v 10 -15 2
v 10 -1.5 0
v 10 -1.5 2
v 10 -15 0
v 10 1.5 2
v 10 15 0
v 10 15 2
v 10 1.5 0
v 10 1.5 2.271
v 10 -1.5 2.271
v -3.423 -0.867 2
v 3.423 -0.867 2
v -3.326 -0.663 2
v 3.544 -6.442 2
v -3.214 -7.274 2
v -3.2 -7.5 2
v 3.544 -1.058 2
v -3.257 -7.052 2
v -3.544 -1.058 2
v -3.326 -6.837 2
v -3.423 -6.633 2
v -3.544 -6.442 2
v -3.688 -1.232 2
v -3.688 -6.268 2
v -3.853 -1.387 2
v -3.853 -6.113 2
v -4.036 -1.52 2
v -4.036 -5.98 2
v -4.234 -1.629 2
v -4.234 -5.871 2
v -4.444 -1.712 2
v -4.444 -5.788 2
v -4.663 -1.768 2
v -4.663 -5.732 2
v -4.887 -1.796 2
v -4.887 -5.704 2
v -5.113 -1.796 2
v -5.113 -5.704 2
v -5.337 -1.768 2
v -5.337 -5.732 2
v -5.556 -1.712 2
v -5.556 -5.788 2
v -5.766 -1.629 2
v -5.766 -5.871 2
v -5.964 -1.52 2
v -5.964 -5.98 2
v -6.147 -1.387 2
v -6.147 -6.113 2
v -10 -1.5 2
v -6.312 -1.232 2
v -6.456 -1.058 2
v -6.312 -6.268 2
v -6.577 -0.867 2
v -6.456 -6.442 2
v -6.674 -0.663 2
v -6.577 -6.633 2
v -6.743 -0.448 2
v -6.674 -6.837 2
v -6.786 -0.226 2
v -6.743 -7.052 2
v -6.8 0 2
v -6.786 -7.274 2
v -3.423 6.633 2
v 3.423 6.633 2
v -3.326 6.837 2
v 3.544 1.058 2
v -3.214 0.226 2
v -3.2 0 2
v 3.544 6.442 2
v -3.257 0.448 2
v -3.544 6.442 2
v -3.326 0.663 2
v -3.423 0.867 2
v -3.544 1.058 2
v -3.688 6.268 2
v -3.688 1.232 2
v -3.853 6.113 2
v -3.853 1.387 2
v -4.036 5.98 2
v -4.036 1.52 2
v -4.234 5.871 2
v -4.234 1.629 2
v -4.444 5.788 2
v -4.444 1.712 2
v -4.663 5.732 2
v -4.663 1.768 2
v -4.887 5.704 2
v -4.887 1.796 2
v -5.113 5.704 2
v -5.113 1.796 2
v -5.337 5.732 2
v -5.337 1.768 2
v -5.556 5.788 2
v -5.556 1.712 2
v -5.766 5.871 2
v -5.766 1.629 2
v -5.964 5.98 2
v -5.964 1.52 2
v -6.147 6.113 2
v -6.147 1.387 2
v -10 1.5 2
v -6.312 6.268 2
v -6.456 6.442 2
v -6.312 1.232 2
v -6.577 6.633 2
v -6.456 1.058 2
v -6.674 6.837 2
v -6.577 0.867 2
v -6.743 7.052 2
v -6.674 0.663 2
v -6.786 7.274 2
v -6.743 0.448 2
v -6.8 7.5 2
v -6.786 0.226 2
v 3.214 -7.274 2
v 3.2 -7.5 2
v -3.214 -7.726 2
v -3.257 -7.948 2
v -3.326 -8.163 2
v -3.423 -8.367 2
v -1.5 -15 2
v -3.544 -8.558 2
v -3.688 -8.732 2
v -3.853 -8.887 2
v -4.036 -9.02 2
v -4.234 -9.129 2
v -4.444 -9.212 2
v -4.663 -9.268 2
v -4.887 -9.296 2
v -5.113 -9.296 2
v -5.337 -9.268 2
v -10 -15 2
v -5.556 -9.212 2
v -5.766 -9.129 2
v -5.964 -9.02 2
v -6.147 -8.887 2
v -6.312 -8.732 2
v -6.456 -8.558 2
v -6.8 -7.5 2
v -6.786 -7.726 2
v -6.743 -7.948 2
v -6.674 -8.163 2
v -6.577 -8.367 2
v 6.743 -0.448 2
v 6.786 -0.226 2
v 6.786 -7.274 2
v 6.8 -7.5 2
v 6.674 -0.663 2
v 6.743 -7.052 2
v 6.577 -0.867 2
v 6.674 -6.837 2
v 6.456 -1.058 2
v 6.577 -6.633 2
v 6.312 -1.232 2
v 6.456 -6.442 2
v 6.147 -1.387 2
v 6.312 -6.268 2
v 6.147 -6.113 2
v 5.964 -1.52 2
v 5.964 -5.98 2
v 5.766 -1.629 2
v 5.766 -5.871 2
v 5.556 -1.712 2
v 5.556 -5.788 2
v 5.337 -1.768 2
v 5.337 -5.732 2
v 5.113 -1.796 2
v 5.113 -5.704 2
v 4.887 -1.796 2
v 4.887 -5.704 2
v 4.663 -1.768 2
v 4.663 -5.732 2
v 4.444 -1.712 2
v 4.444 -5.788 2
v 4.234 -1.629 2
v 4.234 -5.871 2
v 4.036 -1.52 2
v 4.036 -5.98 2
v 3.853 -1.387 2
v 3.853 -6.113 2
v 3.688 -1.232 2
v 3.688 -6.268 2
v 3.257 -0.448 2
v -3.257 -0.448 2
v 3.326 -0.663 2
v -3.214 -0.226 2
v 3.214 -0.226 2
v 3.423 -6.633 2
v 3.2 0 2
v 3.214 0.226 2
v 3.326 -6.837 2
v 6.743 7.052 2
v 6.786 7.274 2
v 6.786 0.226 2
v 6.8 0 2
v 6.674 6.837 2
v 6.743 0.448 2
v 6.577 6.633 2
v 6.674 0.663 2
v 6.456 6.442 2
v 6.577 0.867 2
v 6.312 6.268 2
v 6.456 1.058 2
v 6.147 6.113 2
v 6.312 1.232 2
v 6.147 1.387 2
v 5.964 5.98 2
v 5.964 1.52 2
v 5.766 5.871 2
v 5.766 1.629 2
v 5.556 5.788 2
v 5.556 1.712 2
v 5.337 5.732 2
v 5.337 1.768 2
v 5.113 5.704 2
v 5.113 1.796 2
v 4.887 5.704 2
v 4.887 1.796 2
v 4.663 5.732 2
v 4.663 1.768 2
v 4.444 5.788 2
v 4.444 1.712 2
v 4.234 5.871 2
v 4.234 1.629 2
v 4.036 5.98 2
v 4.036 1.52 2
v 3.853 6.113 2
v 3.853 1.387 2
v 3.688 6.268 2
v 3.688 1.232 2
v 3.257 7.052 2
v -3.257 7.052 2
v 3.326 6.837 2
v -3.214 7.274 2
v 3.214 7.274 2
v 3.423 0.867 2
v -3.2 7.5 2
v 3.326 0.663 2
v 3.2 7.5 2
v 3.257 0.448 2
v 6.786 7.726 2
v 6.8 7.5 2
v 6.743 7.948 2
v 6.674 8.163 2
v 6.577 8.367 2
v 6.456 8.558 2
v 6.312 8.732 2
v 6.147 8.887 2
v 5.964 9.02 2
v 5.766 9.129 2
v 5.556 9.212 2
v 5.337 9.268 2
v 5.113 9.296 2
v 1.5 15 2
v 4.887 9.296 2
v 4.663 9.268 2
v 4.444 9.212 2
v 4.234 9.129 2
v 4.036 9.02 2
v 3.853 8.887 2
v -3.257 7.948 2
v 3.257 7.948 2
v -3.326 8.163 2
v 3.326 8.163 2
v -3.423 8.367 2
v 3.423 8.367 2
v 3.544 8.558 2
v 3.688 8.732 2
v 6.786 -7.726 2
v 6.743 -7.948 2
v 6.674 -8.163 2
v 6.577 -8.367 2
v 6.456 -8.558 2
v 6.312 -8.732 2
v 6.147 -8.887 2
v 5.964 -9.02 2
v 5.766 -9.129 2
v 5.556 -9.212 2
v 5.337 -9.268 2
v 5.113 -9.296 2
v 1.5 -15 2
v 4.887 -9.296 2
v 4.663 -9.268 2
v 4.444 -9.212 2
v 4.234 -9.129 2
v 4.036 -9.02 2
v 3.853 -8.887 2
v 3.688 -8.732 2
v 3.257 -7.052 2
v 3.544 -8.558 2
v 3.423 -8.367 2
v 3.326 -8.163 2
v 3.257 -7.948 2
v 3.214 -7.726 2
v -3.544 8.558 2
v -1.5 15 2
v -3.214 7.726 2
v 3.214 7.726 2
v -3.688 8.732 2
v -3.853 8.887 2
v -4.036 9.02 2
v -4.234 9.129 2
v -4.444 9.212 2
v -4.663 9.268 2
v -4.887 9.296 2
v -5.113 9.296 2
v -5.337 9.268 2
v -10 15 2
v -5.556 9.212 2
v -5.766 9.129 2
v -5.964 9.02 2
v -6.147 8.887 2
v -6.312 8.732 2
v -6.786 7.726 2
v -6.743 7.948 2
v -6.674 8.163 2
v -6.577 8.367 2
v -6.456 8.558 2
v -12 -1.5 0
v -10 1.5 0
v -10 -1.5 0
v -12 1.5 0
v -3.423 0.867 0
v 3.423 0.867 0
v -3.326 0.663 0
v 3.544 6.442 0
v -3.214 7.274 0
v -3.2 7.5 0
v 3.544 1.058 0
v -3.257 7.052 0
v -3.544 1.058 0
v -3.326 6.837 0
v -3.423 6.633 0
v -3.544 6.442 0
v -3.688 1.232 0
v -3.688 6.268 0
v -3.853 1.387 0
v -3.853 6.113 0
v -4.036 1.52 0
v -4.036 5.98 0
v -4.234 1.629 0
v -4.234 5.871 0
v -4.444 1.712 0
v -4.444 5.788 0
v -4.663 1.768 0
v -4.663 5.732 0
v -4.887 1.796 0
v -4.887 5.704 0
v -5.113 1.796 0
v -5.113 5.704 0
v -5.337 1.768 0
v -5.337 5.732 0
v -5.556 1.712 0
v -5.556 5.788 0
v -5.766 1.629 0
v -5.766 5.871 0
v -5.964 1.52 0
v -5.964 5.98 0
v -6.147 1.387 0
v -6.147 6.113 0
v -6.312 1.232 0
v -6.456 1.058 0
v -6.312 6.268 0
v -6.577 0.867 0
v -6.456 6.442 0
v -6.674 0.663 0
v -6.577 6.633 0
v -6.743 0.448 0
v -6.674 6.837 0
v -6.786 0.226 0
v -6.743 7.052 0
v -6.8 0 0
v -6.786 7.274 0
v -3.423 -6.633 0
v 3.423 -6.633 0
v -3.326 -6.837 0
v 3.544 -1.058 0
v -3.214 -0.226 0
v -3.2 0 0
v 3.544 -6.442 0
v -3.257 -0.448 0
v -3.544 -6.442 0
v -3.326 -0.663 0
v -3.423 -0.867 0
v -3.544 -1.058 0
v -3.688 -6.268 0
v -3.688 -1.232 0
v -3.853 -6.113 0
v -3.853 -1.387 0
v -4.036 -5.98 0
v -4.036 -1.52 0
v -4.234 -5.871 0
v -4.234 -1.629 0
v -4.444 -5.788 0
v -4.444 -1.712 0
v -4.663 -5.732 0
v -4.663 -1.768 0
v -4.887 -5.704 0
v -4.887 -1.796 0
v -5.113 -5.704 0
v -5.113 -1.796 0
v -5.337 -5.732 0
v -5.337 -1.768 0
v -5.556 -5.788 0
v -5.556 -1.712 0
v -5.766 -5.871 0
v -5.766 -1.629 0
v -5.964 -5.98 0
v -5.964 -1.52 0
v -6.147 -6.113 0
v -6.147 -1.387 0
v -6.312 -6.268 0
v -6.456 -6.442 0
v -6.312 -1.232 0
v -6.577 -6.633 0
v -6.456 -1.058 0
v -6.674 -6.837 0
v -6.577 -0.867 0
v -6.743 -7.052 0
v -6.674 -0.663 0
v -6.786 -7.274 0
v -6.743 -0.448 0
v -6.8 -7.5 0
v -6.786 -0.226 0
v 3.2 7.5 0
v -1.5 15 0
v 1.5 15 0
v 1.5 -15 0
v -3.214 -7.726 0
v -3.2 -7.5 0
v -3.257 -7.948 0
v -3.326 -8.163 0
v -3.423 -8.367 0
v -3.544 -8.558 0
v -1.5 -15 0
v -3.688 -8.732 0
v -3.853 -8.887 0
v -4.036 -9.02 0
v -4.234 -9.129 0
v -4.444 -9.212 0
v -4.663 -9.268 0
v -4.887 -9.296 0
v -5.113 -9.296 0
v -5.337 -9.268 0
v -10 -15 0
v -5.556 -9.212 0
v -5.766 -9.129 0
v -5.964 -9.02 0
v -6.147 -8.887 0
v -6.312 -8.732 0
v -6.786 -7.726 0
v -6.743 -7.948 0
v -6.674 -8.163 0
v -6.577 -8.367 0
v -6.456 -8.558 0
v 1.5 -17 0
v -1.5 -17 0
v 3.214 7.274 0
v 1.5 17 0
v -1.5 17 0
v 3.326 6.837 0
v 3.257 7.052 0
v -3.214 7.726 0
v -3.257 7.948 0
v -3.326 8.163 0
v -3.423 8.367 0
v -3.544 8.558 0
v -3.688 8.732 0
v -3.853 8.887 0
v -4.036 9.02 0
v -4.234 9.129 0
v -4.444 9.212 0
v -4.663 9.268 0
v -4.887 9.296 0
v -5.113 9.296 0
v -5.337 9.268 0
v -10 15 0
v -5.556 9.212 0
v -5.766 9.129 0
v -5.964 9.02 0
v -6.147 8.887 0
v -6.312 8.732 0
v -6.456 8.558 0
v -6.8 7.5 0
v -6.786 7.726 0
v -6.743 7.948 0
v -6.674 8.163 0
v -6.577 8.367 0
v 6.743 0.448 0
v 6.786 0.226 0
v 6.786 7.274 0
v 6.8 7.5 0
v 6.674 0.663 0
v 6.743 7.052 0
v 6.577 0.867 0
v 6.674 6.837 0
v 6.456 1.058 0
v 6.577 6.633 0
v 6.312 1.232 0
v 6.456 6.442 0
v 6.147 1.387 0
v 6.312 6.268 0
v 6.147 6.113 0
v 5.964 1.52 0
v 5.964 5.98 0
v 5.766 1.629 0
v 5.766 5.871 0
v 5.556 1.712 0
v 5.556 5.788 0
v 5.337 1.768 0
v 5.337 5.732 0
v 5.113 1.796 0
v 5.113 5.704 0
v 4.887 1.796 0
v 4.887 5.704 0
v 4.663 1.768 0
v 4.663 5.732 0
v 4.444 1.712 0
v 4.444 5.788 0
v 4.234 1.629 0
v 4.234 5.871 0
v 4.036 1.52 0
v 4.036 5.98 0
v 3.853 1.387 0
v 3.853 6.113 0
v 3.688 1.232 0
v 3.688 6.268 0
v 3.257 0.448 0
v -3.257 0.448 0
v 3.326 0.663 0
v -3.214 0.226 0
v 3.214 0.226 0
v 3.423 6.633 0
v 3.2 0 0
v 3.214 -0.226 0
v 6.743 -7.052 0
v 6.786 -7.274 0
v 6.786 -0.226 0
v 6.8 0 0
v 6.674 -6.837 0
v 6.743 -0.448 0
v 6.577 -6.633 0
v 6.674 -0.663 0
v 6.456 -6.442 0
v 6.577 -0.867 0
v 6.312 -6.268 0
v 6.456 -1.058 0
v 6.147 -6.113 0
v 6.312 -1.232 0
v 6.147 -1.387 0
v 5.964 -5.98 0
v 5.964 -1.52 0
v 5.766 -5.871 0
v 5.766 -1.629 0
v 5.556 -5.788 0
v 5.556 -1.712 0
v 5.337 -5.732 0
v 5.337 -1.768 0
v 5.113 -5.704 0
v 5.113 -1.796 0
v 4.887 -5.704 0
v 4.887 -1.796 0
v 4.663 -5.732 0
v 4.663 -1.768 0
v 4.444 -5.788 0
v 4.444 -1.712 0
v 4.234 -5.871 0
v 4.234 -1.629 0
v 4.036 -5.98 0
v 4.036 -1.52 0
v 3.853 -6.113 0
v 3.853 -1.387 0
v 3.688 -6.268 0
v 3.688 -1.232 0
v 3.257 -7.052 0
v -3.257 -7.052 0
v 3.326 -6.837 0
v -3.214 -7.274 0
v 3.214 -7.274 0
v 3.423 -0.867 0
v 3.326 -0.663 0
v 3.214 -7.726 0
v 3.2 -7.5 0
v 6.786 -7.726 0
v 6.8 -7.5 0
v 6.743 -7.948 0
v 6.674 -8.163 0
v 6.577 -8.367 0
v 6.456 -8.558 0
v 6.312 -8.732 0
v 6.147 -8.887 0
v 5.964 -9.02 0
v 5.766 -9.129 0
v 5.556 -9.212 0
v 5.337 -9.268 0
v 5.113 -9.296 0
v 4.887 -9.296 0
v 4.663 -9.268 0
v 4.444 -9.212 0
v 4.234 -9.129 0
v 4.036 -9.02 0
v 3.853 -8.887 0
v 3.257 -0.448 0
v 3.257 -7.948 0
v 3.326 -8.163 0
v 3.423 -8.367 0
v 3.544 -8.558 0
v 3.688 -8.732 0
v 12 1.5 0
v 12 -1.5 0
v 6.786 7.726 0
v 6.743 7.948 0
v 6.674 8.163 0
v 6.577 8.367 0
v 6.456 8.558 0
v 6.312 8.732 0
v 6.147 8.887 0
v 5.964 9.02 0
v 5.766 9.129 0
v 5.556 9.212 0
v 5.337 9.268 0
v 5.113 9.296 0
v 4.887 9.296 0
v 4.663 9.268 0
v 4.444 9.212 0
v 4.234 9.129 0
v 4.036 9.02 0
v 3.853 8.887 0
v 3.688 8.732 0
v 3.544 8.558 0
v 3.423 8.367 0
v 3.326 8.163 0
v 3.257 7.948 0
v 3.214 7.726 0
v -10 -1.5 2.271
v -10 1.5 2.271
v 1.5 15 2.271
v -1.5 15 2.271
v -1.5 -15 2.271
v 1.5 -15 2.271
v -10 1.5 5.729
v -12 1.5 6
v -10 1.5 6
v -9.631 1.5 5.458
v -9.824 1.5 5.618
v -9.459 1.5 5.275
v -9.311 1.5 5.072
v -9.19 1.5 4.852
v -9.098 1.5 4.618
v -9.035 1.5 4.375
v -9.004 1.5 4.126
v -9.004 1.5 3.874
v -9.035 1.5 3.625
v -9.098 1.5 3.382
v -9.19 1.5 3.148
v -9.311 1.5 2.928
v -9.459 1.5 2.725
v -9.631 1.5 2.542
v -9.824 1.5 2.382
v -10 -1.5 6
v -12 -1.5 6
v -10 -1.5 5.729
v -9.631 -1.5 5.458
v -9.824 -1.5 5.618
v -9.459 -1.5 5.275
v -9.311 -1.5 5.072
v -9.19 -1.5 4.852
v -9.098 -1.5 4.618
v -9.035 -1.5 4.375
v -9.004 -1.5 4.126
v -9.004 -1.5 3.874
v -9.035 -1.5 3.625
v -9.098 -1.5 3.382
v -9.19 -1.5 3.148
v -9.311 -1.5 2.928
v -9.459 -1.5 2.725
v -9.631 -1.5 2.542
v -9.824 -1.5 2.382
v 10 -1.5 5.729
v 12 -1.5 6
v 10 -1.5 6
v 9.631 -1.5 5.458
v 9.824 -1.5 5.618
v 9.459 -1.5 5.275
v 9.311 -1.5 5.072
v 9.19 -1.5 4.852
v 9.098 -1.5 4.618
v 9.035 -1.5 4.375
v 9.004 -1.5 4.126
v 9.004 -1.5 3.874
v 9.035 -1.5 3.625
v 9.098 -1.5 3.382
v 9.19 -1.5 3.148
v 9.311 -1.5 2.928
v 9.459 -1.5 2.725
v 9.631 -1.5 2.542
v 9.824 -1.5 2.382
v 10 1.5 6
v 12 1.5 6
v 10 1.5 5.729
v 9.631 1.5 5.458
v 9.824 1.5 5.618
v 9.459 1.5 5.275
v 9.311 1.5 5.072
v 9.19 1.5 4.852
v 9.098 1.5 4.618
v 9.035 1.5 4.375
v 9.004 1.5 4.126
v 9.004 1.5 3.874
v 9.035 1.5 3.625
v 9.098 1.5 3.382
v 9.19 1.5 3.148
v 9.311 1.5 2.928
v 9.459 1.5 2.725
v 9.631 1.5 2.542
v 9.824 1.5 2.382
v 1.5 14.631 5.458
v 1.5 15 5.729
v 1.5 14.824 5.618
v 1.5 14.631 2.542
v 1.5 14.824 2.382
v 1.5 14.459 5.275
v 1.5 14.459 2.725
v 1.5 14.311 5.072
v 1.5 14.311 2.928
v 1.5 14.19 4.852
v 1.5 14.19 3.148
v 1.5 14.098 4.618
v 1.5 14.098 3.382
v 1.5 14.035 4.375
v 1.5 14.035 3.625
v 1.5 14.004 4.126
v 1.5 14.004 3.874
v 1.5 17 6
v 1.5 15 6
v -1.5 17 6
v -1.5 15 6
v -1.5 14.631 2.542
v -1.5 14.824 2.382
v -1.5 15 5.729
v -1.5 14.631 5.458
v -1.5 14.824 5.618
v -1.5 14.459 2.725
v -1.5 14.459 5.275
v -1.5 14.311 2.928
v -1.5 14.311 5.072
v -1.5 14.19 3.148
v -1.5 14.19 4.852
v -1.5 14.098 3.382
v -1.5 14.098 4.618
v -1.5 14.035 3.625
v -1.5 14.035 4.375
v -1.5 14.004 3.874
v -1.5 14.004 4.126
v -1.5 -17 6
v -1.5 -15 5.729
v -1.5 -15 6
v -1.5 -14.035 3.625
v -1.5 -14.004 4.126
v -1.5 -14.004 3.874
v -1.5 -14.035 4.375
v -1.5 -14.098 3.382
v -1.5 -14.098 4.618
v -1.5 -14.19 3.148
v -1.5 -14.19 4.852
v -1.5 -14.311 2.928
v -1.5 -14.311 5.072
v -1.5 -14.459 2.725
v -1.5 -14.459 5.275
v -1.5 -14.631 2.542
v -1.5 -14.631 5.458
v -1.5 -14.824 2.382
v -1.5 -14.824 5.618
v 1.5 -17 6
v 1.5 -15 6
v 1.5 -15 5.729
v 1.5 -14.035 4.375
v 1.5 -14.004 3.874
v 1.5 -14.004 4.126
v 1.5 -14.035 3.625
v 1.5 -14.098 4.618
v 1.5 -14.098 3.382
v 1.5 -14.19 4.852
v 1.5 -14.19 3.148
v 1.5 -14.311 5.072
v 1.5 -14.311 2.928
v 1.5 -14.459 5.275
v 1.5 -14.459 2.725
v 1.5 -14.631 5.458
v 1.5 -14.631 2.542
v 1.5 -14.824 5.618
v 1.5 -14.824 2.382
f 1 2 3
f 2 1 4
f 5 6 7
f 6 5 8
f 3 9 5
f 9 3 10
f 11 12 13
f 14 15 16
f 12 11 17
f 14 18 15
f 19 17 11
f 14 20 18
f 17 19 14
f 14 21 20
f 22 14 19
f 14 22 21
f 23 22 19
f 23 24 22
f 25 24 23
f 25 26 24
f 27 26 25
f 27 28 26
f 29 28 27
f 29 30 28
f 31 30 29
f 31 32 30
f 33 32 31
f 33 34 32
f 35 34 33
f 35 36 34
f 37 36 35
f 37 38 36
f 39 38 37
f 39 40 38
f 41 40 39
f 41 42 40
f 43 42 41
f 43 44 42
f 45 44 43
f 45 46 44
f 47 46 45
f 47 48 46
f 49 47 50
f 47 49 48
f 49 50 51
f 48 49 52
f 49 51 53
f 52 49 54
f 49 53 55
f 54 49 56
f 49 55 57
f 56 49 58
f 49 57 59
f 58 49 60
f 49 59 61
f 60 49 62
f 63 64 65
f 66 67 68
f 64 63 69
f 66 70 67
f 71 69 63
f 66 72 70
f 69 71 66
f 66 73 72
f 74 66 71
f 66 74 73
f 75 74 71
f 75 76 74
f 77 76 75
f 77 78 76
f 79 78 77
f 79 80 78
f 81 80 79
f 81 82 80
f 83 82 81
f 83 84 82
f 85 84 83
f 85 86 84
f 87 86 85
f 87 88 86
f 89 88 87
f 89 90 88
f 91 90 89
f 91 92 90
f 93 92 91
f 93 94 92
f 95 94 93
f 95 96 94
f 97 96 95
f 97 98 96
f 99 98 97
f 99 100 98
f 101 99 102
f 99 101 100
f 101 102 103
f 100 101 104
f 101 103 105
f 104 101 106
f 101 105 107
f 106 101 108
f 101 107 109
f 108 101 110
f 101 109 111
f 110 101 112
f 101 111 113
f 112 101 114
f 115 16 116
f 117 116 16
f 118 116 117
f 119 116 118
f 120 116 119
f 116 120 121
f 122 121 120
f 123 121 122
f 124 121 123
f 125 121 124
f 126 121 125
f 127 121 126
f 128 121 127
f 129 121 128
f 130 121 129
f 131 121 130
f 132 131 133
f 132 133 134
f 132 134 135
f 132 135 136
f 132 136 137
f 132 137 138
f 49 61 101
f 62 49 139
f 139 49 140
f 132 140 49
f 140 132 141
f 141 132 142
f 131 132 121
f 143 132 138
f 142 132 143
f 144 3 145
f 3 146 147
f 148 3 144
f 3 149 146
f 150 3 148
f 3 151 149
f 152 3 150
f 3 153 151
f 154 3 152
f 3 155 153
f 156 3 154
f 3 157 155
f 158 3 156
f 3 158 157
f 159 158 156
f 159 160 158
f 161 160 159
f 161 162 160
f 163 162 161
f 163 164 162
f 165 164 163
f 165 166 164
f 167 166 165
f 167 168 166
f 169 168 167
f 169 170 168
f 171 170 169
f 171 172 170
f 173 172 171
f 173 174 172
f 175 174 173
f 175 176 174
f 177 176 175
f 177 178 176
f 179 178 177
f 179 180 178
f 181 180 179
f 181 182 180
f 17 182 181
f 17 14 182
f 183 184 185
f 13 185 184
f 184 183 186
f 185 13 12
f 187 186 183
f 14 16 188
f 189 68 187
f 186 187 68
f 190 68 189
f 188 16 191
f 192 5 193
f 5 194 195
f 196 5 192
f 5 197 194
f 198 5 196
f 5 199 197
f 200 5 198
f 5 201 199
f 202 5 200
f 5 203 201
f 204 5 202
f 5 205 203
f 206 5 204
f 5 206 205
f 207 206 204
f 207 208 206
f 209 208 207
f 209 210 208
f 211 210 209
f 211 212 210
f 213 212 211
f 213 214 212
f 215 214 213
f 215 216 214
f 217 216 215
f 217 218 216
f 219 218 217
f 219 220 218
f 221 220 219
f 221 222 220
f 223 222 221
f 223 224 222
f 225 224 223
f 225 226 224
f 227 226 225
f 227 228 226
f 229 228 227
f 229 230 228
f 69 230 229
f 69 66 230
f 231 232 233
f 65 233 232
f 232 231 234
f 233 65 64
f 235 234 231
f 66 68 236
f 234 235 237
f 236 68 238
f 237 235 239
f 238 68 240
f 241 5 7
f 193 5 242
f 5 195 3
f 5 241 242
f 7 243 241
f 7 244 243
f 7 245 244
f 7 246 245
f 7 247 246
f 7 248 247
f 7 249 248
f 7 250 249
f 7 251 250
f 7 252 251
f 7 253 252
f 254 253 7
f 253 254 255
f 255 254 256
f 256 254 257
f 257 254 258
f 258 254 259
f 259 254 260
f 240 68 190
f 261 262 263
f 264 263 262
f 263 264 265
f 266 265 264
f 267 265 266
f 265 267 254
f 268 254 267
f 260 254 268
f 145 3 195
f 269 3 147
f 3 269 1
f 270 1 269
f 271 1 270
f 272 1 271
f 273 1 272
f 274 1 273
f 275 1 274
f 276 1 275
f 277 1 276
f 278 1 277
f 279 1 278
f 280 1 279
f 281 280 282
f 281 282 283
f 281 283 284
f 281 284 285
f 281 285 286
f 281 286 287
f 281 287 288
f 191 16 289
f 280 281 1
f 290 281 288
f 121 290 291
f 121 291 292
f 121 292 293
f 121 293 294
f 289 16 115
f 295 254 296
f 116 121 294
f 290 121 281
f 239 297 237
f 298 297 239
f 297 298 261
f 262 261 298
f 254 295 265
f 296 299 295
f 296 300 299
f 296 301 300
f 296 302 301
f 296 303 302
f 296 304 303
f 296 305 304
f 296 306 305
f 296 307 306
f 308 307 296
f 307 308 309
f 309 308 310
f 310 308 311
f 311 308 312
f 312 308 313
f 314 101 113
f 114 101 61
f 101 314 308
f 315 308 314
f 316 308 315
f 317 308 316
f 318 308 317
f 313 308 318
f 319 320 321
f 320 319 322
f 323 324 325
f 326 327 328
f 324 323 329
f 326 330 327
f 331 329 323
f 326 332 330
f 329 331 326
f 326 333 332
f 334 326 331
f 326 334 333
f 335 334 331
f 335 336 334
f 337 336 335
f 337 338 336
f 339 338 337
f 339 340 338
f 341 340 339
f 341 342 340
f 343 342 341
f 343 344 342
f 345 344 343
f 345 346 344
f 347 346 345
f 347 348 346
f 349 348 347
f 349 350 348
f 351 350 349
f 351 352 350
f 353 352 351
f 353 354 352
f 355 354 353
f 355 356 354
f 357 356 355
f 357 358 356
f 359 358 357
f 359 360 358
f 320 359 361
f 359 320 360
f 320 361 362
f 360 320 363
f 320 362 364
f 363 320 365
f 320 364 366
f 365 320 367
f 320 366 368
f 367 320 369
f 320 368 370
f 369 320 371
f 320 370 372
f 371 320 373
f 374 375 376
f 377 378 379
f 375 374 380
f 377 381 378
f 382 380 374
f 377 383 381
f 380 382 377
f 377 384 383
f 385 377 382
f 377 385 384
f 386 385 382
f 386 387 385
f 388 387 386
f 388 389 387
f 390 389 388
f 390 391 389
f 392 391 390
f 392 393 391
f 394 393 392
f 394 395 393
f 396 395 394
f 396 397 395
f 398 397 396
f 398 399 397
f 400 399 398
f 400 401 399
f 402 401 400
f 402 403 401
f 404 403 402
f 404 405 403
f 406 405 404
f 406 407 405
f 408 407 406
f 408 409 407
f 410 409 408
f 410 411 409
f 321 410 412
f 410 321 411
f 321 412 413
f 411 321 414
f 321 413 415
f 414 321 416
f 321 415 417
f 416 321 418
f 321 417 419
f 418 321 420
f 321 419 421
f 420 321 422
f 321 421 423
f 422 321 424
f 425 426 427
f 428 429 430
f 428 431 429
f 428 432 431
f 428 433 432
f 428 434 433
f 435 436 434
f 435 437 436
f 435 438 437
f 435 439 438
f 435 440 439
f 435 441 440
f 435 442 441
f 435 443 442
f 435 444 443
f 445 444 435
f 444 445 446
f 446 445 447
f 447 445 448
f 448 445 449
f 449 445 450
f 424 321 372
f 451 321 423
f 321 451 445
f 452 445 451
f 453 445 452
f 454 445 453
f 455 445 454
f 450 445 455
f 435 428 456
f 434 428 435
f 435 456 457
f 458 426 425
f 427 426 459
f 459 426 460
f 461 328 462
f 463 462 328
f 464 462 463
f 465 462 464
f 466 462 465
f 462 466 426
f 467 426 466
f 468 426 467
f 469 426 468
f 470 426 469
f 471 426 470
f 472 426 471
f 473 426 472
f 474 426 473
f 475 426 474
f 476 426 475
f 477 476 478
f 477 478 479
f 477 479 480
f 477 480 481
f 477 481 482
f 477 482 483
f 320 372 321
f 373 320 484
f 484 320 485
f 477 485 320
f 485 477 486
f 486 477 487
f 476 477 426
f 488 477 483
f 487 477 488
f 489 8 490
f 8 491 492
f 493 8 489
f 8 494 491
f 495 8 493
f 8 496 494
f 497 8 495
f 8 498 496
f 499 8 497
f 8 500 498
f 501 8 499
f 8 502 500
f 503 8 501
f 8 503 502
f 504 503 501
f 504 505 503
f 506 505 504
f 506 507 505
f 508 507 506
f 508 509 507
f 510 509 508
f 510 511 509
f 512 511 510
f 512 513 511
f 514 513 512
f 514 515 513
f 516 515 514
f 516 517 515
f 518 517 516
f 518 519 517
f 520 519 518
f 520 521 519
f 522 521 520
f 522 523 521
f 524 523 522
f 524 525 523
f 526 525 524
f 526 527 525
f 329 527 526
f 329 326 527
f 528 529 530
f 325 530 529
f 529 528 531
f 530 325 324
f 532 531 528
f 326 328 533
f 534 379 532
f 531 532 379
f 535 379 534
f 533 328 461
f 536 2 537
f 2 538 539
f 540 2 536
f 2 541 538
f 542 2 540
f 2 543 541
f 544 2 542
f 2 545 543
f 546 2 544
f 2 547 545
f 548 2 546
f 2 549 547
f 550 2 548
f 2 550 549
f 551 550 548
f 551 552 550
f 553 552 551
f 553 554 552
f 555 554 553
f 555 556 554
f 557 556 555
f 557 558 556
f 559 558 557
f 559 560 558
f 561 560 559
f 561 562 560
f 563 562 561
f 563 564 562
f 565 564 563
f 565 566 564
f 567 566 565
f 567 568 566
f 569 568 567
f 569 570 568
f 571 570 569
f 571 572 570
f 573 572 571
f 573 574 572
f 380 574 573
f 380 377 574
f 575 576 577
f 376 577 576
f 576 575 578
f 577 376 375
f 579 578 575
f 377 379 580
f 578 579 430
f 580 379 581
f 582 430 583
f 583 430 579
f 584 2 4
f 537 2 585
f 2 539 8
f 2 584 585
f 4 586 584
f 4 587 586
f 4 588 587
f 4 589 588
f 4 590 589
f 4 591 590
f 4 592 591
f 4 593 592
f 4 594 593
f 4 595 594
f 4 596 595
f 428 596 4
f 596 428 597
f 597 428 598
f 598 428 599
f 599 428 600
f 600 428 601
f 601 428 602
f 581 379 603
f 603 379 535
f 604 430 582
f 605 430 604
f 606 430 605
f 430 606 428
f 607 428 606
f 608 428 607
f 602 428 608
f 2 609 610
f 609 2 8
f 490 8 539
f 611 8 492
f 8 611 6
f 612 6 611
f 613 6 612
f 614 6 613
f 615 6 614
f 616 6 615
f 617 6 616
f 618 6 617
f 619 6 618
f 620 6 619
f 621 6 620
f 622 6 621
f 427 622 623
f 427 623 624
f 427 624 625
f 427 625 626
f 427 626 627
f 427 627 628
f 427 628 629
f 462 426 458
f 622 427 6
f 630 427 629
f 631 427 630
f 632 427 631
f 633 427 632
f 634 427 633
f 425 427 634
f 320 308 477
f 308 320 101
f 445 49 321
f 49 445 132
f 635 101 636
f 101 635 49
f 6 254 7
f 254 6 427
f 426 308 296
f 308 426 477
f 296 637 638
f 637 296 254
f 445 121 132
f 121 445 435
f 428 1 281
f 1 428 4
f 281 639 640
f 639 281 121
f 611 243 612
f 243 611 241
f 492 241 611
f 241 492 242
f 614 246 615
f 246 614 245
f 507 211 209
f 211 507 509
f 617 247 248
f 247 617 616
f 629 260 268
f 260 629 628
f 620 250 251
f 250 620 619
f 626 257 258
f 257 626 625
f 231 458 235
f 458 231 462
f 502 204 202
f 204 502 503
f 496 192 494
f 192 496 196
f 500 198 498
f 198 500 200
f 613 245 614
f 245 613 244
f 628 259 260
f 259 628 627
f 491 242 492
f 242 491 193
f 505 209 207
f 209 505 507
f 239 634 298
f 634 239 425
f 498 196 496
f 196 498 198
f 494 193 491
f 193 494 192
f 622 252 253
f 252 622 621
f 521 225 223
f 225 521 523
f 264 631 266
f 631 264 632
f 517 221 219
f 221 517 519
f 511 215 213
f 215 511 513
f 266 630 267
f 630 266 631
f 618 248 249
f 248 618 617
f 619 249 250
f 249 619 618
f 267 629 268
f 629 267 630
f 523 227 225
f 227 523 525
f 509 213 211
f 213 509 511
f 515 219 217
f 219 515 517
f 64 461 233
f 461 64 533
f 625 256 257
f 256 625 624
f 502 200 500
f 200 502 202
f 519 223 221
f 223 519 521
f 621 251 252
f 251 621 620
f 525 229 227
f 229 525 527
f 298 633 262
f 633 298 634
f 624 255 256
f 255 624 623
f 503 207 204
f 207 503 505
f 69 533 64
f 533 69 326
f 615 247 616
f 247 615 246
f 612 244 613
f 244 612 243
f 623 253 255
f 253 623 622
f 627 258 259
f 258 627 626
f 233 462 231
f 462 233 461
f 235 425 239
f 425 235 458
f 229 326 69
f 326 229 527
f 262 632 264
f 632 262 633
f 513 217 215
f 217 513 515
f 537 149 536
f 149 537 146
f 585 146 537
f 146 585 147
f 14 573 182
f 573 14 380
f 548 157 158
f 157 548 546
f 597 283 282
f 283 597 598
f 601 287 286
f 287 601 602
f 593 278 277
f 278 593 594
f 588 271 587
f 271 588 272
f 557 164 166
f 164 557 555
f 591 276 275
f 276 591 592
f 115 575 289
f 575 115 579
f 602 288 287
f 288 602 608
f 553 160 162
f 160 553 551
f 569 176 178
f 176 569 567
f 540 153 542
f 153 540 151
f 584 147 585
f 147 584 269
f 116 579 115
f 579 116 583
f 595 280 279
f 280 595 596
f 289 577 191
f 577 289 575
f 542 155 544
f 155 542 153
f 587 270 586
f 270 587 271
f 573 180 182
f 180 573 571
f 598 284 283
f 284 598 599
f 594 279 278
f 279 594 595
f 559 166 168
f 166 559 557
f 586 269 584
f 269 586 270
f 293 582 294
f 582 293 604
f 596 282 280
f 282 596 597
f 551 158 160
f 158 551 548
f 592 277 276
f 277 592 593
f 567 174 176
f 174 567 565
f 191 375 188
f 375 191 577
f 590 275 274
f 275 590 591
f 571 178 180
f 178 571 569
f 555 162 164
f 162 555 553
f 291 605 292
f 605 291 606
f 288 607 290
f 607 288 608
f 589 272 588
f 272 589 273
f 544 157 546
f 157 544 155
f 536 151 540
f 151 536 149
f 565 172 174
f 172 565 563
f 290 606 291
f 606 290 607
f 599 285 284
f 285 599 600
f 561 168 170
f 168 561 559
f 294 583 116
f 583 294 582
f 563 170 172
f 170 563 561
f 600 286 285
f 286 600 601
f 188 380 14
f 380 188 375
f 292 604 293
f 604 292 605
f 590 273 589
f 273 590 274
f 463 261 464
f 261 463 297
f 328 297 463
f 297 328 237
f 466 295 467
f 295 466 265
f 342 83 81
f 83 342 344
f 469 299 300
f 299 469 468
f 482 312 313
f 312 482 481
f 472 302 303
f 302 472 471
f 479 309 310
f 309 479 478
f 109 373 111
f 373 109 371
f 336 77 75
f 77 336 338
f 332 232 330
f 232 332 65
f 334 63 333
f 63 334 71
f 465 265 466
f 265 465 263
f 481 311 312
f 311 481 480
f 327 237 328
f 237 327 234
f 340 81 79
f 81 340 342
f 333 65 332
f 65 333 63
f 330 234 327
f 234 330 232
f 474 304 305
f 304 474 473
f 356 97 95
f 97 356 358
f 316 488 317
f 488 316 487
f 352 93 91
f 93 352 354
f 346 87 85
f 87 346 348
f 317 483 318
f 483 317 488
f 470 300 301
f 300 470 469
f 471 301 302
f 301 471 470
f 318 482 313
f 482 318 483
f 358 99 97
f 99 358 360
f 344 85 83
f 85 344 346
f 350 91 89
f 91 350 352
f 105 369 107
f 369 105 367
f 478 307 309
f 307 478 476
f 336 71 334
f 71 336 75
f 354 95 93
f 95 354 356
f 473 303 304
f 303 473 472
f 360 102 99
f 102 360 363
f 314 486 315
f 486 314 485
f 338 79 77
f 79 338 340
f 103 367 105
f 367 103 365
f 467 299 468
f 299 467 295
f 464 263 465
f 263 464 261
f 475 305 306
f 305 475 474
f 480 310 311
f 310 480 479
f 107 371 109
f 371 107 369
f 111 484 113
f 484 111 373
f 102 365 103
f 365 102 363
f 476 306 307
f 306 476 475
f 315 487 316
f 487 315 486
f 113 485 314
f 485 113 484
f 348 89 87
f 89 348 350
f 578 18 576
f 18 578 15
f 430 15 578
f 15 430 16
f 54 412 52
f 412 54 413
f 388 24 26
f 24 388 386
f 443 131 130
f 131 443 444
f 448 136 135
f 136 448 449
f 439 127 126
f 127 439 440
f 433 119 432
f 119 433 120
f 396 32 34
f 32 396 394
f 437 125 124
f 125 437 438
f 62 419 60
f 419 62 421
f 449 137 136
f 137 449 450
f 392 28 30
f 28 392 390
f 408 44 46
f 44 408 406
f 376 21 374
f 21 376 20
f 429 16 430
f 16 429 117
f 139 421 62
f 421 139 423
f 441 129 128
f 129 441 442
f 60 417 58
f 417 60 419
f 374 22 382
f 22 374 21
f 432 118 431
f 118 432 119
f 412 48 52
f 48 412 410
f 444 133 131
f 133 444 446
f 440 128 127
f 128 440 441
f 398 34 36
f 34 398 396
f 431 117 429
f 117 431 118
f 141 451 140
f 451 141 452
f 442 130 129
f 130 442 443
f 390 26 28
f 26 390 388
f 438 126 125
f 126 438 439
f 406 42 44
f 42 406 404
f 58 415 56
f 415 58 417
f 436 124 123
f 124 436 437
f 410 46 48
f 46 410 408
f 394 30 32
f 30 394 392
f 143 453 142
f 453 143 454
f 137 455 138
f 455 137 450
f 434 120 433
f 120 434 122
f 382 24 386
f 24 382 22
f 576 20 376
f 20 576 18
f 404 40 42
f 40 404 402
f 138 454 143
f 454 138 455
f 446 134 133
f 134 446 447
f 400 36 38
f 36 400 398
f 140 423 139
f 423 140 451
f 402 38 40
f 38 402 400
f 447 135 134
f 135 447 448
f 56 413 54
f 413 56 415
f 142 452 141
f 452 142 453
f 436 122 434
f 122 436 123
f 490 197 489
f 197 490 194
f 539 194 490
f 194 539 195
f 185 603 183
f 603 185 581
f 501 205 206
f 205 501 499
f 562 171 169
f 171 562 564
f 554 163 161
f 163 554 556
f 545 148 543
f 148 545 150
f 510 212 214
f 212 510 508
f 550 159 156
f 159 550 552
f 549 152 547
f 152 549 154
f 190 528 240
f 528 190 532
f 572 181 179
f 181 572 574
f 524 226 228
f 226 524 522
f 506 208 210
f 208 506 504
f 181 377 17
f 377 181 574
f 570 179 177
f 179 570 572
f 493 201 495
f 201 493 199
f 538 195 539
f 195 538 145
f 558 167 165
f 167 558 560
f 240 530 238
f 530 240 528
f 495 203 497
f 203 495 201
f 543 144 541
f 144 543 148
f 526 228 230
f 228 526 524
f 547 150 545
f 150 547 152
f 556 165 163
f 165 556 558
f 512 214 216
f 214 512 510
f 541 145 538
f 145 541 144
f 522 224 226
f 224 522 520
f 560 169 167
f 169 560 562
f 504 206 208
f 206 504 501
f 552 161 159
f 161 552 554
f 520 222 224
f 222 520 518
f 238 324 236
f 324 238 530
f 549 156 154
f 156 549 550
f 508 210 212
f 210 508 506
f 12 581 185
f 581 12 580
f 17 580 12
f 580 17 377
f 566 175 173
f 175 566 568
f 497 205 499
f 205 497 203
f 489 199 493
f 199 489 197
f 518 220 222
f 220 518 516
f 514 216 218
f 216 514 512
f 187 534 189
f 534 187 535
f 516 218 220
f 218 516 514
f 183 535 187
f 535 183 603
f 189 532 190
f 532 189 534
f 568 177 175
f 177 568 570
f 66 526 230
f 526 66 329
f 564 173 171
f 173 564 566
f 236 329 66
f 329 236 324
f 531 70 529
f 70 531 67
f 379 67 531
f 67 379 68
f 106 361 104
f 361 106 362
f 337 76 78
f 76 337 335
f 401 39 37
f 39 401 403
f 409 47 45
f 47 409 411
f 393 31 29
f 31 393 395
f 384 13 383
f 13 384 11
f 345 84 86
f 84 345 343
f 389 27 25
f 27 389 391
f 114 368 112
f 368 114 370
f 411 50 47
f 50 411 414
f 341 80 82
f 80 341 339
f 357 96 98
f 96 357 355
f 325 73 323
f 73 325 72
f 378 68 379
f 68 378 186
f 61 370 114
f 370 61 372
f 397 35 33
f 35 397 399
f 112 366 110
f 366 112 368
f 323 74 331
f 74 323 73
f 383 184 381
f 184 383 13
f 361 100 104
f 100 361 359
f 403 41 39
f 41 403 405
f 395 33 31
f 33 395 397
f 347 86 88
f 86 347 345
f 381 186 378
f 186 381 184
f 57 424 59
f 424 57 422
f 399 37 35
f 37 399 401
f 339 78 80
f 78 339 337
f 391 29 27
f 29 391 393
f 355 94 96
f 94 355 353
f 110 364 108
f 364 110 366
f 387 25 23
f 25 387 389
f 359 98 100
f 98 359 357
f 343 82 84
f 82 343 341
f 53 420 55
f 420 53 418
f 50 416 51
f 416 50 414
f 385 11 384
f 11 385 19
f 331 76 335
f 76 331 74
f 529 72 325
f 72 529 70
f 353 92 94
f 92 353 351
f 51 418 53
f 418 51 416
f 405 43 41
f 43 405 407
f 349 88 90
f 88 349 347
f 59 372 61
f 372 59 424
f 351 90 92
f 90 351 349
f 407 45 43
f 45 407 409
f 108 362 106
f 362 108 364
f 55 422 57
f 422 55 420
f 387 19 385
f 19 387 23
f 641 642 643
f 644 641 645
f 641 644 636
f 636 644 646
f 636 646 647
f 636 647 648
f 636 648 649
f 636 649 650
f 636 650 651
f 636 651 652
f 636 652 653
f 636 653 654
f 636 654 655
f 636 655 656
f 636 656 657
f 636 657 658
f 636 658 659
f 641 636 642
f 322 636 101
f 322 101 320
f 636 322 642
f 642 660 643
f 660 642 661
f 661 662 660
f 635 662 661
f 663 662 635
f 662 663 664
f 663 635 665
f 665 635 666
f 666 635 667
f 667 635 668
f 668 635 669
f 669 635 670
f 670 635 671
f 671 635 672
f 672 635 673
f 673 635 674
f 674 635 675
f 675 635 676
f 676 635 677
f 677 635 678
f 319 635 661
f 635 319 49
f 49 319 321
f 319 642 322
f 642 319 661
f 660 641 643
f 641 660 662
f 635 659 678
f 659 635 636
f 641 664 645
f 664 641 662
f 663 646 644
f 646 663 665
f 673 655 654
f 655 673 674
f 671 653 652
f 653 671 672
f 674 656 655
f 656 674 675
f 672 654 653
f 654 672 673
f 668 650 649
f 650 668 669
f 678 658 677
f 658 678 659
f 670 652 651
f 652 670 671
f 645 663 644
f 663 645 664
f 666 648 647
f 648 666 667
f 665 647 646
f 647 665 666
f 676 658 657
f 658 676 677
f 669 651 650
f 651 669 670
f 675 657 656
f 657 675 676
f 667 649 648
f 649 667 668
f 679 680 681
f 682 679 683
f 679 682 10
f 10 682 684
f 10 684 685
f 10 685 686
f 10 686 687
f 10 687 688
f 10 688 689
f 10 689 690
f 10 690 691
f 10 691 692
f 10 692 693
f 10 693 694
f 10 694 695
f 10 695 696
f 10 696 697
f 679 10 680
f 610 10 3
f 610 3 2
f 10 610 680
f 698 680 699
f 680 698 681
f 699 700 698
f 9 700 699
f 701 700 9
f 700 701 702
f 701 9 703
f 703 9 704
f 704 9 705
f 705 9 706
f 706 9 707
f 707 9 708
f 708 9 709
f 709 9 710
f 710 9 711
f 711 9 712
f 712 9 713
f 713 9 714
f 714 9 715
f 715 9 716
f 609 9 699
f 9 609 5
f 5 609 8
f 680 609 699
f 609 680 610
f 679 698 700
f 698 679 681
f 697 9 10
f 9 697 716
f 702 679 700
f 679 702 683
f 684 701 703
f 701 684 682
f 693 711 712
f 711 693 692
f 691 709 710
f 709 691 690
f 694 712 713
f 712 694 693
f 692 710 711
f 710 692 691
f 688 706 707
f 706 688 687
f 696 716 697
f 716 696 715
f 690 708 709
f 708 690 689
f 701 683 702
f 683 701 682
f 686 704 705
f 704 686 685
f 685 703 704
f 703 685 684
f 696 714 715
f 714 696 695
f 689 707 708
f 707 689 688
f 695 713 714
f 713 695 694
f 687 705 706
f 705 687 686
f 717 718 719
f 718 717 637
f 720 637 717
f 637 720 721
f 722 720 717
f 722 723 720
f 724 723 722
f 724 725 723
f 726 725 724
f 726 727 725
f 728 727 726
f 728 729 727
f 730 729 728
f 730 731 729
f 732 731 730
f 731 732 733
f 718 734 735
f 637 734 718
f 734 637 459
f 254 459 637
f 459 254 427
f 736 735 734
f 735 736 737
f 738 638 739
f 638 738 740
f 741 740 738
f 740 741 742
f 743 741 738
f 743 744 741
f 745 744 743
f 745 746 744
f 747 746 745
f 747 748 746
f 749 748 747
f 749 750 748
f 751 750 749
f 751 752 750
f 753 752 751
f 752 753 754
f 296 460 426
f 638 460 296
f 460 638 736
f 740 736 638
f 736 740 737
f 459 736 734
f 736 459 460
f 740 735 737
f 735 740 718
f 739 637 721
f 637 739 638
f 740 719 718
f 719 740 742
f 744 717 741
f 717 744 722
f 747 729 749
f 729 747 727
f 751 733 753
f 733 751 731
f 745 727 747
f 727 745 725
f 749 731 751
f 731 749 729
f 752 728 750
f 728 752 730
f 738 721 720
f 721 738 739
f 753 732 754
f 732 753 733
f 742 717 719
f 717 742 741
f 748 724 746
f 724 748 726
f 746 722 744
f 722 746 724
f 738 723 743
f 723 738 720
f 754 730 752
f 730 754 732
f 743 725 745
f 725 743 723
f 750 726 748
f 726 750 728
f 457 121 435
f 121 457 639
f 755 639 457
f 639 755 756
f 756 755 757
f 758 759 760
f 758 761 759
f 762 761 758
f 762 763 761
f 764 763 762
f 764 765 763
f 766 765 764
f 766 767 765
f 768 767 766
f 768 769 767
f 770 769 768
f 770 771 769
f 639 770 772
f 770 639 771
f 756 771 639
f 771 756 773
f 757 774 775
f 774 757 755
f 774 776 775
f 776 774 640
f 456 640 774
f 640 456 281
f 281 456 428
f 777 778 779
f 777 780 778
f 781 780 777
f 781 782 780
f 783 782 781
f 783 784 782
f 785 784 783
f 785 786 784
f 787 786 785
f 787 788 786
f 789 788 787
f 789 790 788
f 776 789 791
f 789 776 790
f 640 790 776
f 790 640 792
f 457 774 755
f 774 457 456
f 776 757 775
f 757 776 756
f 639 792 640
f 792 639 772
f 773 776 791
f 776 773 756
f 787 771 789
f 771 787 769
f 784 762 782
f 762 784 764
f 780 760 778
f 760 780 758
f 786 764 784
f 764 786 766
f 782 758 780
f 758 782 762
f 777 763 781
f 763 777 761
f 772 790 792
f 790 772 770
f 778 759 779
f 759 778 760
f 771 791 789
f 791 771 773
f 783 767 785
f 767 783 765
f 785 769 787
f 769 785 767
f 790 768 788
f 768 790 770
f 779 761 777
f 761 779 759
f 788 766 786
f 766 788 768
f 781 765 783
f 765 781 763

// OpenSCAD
$fn = 50;
BASE_W = 20;
BASE_D = 30;
BASE_H = 2;
PIN_W = 3;
PIN_D = 2;
PIN_H = 6;
LOCK_R = 2;
LOCK_Z = PIN_H - LOCK_R;


difference() {
  translate([0, 0, 1]) {
    cube([BASE_W, BASE_D, BASE_H], center=true);
  }
  translate([BASE_W/4, BASE_D/4, 0]) {
    cylinder(r=1.8, h=10, center=true);
  }
  translate([BASE_W/4, -BASE_D/4, 0]) {
    cylinder(r=1.8, h=10, center=true);
  }
  translate([-BASE_W/4, BASE_D/4, 0]) {
    cylinder(r=1.8, h=10, center=true);
  }
  translate([-BASE_W/4, -BASE_D/4, 0]) {
    cylinder(r=1.8, h=10, center=true);
  }
  translate([BASE_W/4, 0, 0]) {
    cylinder(r=1.8, h=10, center=true);
  }
  translate([-BASE_W/4, 0, 0]) {
    cylinder(r=1.8, h=10, center=true);
  }
}

module pin_lock() {
  difference() {
    union() {
      translate([0, 0, PIN_H/2]) {
        cube([PIN_W, PIN_D, PIN_H], center=true);
      }
      translate([0, 0, LOCK_Z]) {
        rotate([0, 90, 0]) {
          cylinder(r=LOCK_R, h=PIN_W, center=true);
        }
      }
    }
    translate([0, PIN_D, PIN_H/2]) {
      cube([PIN_W, PIN_D, PIN_H], center=true);
    }
  }
}

translate([-(BASE_W/2+1), 0, 0]) {
  rotate([0, 0, 90]) {
    pin_lock();
  }
}

translate([(BASE_W/2+1), 0, 0]) {
  rotate([0, 0, 270]) {
    pin_lock();
  }
}

translate([0, (BASE_D/2+1), 0]) {
  rotate([0, 0, 0]) {
    pin_lock();
  }
}

translate([0, -(BASE_D/2+1), 0]) {
  rotate([0, 0, 180]) {
    pin_lock();
  }
}
